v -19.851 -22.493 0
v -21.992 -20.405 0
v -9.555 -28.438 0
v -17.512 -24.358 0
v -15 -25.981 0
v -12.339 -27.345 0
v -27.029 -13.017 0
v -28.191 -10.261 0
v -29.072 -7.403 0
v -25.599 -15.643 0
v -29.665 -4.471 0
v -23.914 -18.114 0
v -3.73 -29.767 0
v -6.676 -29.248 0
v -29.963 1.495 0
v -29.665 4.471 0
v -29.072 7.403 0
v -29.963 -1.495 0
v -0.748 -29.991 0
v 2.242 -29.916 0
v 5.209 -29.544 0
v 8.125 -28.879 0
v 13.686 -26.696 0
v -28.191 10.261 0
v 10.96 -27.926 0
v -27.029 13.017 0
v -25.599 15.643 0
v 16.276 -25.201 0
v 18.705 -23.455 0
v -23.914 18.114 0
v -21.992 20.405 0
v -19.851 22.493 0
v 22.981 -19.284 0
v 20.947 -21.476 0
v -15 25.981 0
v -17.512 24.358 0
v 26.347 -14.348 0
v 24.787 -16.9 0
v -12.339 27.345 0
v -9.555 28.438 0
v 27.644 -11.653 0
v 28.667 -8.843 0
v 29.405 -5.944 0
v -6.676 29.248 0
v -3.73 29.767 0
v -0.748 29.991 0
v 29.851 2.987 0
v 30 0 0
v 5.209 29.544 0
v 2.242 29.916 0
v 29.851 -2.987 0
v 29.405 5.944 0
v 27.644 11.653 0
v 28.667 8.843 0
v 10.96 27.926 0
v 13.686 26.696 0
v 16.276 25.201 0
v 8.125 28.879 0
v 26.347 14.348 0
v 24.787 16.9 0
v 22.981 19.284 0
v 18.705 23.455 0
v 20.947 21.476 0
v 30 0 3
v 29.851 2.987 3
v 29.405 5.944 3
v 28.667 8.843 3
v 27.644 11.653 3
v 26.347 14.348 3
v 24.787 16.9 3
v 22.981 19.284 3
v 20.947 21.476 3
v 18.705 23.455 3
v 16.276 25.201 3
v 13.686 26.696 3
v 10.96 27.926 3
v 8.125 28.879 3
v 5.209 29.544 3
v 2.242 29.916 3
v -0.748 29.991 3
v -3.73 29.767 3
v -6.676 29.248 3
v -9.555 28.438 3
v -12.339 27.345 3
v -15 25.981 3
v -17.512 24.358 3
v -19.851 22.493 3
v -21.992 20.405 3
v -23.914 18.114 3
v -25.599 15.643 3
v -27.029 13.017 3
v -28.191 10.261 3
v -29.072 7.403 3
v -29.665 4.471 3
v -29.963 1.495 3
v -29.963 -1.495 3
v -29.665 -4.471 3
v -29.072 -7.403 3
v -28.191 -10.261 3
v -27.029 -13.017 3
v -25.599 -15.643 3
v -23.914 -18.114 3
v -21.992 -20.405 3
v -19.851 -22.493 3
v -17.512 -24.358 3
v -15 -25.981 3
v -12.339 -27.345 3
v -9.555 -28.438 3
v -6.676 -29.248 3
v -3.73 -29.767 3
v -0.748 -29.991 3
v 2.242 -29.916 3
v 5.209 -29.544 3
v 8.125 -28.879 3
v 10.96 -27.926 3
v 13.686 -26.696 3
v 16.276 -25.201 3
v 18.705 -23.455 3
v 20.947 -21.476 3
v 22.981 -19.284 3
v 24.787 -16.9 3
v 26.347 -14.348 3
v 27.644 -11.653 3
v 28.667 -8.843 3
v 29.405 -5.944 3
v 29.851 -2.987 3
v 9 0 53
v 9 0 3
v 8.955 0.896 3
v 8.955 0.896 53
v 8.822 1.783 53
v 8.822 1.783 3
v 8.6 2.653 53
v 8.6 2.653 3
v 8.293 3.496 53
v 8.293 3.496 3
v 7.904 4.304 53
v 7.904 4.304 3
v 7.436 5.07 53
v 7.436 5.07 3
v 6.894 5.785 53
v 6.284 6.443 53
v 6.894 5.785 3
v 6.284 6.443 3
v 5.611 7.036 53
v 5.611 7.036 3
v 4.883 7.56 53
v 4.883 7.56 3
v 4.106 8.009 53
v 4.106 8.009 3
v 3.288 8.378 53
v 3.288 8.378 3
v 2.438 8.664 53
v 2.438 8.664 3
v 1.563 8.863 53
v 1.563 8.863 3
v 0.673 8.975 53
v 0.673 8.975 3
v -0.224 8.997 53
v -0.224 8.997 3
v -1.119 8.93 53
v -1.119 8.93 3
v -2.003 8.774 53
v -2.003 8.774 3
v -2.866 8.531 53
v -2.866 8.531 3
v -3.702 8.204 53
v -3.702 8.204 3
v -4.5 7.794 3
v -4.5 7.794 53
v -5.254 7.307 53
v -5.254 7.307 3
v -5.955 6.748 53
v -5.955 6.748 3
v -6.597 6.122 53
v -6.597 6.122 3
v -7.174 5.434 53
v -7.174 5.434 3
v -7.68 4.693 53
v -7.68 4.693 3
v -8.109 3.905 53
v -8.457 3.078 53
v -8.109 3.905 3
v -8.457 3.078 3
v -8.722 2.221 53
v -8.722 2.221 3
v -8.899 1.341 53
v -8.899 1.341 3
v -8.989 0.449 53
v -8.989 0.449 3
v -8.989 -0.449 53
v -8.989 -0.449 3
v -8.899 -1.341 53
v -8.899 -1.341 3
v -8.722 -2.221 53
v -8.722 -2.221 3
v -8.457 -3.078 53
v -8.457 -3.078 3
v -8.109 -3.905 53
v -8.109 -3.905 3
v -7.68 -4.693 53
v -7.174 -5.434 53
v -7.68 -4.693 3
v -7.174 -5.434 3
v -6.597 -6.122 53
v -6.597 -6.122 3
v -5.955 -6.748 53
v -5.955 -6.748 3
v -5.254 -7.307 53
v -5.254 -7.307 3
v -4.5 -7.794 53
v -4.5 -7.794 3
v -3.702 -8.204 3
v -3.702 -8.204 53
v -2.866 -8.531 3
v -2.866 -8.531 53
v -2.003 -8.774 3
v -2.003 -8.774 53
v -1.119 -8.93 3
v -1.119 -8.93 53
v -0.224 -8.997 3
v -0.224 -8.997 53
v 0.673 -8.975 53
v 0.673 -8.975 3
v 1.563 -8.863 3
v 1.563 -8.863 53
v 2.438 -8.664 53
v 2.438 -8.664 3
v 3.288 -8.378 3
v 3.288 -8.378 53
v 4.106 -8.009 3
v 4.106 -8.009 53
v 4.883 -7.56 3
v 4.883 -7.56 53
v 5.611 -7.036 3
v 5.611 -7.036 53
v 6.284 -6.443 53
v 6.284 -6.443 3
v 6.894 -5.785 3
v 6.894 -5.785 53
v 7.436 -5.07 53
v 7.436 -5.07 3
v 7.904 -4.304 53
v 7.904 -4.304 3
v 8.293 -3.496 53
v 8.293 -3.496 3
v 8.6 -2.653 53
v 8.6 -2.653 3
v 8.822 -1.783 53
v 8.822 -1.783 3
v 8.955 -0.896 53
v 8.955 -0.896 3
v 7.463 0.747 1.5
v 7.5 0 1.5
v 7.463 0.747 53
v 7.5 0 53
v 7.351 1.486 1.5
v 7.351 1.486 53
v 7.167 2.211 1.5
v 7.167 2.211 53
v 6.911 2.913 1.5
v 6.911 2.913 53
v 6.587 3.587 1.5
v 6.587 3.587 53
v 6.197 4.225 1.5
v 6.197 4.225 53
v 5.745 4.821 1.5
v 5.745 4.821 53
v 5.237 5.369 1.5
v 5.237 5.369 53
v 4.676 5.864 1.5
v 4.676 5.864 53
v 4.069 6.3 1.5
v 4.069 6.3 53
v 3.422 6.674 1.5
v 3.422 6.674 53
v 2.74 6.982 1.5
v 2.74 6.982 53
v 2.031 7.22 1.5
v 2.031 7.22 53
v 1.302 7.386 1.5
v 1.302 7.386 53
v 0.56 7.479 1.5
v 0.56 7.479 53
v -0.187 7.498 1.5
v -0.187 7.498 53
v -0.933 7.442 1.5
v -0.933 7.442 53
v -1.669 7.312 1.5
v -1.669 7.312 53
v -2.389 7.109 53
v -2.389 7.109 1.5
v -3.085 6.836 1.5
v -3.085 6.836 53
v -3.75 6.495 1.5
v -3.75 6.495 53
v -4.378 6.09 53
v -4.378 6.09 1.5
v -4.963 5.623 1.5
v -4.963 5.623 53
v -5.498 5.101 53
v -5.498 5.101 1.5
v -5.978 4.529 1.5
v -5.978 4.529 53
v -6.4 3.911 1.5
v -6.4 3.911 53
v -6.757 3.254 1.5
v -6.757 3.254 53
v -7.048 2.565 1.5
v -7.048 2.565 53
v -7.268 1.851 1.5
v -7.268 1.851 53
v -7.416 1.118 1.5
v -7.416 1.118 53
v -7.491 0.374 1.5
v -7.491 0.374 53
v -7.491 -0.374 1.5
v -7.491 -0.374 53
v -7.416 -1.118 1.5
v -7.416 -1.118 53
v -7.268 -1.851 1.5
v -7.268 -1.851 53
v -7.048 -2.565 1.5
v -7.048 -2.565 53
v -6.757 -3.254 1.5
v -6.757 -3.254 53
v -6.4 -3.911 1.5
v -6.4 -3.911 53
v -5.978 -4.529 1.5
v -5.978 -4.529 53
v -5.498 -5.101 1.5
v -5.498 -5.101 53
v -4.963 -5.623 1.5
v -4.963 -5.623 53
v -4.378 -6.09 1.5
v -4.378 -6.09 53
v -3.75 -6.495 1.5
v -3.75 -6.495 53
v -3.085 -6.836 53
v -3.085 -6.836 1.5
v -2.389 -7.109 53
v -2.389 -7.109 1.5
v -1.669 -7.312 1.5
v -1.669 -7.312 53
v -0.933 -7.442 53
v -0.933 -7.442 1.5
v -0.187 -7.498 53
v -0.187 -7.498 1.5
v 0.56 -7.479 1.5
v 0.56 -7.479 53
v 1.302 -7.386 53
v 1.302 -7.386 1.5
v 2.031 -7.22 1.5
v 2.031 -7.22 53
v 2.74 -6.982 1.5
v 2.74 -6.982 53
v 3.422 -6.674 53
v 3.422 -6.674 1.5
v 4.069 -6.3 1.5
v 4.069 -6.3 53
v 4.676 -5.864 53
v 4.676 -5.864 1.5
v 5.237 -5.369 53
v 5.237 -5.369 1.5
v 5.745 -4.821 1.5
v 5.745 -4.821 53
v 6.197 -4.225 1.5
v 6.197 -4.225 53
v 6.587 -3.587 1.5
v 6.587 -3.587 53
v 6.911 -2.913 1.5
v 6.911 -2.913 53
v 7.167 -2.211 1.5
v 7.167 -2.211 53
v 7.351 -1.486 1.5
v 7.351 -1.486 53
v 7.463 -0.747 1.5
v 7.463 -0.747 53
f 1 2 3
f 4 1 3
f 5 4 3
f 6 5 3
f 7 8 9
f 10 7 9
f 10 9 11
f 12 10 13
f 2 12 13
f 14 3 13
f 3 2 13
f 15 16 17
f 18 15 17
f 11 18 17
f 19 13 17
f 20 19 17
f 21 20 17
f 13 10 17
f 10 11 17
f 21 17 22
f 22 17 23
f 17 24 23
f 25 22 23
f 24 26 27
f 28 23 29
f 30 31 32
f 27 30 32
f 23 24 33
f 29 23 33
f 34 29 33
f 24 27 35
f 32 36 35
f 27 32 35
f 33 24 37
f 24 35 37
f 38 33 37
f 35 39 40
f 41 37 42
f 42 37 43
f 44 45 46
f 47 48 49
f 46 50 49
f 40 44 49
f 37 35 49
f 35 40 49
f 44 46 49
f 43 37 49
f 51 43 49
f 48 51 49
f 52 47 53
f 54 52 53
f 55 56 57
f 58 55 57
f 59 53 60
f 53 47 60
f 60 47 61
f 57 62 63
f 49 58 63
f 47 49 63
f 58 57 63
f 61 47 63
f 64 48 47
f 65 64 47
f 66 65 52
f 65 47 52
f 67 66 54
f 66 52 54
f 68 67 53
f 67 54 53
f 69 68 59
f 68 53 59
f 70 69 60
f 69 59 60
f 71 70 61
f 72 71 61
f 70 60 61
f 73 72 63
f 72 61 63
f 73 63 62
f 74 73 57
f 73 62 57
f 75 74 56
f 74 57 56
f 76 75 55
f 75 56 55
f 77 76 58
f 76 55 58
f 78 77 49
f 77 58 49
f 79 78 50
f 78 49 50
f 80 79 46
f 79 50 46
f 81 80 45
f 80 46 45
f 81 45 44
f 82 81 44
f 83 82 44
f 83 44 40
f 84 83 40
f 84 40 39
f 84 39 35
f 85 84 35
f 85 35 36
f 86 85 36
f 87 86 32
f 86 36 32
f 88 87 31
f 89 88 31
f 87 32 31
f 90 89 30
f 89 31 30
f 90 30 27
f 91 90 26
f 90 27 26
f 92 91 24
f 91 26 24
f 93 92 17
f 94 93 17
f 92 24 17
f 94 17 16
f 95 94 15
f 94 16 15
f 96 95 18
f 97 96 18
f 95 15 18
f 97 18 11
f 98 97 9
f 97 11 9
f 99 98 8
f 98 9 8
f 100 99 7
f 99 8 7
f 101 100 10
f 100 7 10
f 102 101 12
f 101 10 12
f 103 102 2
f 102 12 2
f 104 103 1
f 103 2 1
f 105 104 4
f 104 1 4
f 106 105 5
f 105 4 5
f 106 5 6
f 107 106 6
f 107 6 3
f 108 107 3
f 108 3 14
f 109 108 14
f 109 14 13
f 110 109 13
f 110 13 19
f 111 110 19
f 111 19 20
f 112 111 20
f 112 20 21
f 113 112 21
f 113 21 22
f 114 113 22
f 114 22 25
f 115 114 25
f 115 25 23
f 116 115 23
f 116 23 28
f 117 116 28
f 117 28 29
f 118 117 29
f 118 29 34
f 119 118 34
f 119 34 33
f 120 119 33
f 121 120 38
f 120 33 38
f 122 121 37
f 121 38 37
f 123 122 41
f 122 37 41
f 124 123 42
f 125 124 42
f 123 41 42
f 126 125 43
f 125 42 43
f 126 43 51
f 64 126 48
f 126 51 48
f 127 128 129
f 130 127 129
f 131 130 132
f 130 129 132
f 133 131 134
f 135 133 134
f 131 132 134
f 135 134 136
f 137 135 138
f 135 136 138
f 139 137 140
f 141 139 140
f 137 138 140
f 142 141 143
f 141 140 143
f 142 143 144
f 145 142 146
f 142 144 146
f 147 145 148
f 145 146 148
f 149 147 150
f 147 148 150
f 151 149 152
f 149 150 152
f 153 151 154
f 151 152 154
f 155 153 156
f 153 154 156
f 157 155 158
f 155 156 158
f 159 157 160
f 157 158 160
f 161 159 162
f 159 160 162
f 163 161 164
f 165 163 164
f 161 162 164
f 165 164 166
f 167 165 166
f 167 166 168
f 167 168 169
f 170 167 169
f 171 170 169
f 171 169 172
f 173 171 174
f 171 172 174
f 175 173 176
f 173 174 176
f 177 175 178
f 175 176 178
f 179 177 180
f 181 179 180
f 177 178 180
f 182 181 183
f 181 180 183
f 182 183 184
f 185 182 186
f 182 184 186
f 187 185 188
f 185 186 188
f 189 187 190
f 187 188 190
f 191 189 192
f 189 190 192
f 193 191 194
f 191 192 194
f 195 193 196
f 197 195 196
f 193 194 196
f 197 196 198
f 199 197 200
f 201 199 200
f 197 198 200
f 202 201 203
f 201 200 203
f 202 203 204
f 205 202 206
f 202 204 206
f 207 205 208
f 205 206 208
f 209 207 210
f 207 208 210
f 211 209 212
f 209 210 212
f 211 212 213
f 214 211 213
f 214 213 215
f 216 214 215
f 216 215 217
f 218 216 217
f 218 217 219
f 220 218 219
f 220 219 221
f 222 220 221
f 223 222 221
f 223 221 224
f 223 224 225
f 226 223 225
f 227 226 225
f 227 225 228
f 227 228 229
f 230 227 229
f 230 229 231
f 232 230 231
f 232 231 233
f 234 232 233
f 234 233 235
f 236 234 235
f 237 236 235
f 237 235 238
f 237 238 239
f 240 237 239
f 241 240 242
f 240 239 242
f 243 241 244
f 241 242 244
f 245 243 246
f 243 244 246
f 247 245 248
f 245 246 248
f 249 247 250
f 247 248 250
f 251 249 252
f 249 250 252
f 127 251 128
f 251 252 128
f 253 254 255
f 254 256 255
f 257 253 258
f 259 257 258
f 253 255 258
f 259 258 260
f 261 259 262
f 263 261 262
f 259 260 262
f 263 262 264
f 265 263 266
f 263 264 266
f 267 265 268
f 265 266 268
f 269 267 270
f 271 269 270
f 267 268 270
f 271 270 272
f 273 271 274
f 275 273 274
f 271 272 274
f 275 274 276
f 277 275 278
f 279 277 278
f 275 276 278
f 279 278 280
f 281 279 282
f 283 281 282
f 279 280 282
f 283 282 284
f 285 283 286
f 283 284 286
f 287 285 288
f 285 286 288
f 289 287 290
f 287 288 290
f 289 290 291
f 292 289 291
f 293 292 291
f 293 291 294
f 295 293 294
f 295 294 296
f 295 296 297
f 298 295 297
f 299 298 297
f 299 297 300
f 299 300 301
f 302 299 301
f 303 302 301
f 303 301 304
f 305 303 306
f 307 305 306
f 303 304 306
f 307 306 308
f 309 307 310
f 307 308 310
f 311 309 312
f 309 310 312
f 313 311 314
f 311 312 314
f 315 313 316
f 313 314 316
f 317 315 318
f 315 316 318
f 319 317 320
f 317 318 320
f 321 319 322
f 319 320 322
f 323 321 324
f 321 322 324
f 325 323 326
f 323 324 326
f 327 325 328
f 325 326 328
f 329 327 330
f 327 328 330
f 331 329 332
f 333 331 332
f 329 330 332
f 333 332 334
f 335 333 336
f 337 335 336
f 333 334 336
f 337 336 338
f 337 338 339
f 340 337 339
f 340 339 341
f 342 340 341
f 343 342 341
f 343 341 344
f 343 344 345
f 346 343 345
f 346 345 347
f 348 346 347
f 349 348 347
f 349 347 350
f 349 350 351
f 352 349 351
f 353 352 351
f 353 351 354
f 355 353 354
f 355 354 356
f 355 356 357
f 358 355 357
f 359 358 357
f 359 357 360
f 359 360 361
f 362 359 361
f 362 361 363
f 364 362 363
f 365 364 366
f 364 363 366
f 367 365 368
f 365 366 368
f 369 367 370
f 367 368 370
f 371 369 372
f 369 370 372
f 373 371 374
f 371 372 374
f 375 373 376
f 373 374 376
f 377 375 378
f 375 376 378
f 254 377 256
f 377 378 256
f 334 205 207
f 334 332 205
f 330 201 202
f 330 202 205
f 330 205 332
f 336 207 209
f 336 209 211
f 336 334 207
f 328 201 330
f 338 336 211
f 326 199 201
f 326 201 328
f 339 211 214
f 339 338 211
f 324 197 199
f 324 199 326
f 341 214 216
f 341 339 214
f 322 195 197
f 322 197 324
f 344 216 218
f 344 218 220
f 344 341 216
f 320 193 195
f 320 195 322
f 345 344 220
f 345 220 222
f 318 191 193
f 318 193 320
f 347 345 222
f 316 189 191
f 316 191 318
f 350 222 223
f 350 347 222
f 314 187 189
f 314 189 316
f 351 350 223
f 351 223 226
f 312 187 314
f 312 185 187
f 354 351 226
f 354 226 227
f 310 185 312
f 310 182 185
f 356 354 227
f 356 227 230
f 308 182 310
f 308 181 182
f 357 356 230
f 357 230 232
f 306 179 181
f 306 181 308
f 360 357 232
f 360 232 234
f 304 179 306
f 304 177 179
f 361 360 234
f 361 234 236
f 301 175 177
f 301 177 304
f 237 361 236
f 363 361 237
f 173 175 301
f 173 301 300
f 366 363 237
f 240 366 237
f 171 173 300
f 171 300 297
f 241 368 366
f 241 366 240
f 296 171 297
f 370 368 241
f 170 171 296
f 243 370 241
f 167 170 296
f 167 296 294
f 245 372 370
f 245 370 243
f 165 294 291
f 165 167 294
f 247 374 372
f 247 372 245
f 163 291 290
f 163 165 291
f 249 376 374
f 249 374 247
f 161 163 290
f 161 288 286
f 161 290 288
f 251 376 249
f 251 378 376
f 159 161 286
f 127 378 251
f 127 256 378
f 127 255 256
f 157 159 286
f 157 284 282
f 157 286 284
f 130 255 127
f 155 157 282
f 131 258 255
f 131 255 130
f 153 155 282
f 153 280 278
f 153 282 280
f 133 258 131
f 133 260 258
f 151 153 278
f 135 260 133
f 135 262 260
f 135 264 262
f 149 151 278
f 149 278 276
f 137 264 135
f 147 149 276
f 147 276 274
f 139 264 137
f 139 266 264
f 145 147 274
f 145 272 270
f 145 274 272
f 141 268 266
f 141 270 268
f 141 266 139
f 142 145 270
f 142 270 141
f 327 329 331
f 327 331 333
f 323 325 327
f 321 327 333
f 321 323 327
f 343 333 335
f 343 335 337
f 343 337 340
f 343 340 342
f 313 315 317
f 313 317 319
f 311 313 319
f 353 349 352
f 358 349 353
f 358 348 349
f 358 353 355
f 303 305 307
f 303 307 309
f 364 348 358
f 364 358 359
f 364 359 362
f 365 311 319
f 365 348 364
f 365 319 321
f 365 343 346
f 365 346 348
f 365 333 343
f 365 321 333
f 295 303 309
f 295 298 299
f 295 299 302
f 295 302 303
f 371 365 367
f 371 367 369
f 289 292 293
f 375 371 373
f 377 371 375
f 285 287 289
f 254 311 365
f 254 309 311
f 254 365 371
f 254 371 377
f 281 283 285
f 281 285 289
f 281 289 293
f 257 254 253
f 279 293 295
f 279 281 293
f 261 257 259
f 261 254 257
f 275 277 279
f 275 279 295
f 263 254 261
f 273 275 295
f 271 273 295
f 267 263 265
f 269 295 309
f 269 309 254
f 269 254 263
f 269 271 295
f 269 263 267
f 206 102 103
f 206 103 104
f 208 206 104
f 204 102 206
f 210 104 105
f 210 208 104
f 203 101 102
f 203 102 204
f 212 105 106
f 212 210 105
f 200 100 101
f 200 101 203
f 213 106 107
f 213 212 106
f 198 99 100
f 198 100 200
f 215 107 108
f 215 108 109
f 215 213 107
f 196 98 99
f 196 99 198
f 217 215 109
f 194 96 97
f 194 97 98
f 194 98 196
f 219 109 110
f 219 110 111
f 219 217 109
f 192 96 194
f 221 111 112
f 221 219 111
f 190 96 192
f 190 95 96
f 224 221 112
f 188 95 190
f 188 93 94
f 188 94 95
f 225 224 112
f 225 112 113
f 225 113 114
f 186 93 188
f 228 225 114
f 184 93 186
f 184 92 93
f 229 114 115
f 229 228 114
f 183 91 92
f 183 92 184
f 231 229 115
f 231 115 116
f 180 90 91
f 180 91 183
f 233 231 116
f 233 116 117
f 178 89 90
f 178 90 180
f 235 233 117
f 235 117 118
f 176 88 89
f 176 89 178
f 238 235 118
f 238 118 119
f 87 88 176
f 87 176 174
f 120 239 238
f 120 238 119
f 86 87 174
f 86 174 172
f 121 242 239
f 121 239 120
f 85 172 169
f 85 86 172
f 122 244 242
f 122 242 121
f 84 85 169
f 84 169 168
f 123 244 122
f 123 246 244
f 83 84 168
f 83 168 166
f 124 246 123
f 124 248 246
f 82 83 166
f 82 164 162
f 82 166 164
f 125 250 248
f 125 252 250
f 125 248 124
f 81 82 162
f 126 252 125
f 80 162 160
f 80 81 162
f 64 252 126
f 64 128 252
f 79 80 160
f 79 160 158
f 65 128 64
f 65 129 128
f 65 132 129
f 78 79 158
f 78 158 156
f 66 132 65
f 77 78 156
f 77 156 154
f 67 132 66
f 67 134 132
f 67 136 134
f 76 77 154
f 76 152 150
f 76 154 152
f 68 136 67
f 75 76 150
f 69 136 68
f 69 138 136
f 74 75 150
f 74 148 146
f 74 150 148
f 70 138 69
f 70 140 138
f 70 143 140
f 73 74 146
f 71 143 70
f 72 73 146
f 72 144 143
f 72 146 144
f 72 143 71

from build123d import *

# Parameters (mm, degrees)
F0_R     = 30
F1_DEPTH = 3
F2_R     = 9
F3_DEPTH = 50
F4_T     = 1.5


# Not quite as in the source:
# - a shell that OpenCascade refuses in one call is made with other operations: the cavity is built on its own and cut out


with BuildPart() as f1:
    # F0 (on Top) → F1 (new body)
    with BuildSketch(Plane.XY):
        Circle(F0_R)
    extrude(amount=F1_DEPTH)

    # F2 (on face) → F3 (join)
    with BuildSketch(Plane.XY.offset(3)):
        Circle(F2_R)
    extrude(amount=F3_DEPTH)

    # F4: shell of thickness 1.5, made by hand


with BuildPart() as f4_core1:
    # F4_t2: copy of F1
    add(f1.part)

    # the walls: a layer under each face that stays
    f4_faces = [f4_core1.faces().sort_by_distance(p)[0] for p in [
        (-30, 0, 1.5),
        (0, 0, 0),
        (-20, -20, 3),
        (-9, 0, 28),
    ]]
    thicken(f4_faces, amount=-F4_T, mode=Mode.SUBTRACT)

    # F4_s3 → F4_t4 (revolve, cut)
    with BuildSketch(Plane.XZ):
        Polygon((9.015, 3.015), (9, 1.5), (7.5, 1.5), (7.5, 3), align=None)
    revolve(axis=Axis((0, 0, 3), (0, 0, 1)), mode=Mode.SUBTRACT)


with BuildPart() as f1_1:
    add(f1.part)

    # what is left inside the walls is the cavity
    f4_cavity = [f4_core1.part.solids().sort_by_distance(p)[0] for p in [
        (-7.485, 0, 18.666667),
    ]]
    add(f4_cavity, mode=Mode.SUBTRACT)


solid = f1_1.part
